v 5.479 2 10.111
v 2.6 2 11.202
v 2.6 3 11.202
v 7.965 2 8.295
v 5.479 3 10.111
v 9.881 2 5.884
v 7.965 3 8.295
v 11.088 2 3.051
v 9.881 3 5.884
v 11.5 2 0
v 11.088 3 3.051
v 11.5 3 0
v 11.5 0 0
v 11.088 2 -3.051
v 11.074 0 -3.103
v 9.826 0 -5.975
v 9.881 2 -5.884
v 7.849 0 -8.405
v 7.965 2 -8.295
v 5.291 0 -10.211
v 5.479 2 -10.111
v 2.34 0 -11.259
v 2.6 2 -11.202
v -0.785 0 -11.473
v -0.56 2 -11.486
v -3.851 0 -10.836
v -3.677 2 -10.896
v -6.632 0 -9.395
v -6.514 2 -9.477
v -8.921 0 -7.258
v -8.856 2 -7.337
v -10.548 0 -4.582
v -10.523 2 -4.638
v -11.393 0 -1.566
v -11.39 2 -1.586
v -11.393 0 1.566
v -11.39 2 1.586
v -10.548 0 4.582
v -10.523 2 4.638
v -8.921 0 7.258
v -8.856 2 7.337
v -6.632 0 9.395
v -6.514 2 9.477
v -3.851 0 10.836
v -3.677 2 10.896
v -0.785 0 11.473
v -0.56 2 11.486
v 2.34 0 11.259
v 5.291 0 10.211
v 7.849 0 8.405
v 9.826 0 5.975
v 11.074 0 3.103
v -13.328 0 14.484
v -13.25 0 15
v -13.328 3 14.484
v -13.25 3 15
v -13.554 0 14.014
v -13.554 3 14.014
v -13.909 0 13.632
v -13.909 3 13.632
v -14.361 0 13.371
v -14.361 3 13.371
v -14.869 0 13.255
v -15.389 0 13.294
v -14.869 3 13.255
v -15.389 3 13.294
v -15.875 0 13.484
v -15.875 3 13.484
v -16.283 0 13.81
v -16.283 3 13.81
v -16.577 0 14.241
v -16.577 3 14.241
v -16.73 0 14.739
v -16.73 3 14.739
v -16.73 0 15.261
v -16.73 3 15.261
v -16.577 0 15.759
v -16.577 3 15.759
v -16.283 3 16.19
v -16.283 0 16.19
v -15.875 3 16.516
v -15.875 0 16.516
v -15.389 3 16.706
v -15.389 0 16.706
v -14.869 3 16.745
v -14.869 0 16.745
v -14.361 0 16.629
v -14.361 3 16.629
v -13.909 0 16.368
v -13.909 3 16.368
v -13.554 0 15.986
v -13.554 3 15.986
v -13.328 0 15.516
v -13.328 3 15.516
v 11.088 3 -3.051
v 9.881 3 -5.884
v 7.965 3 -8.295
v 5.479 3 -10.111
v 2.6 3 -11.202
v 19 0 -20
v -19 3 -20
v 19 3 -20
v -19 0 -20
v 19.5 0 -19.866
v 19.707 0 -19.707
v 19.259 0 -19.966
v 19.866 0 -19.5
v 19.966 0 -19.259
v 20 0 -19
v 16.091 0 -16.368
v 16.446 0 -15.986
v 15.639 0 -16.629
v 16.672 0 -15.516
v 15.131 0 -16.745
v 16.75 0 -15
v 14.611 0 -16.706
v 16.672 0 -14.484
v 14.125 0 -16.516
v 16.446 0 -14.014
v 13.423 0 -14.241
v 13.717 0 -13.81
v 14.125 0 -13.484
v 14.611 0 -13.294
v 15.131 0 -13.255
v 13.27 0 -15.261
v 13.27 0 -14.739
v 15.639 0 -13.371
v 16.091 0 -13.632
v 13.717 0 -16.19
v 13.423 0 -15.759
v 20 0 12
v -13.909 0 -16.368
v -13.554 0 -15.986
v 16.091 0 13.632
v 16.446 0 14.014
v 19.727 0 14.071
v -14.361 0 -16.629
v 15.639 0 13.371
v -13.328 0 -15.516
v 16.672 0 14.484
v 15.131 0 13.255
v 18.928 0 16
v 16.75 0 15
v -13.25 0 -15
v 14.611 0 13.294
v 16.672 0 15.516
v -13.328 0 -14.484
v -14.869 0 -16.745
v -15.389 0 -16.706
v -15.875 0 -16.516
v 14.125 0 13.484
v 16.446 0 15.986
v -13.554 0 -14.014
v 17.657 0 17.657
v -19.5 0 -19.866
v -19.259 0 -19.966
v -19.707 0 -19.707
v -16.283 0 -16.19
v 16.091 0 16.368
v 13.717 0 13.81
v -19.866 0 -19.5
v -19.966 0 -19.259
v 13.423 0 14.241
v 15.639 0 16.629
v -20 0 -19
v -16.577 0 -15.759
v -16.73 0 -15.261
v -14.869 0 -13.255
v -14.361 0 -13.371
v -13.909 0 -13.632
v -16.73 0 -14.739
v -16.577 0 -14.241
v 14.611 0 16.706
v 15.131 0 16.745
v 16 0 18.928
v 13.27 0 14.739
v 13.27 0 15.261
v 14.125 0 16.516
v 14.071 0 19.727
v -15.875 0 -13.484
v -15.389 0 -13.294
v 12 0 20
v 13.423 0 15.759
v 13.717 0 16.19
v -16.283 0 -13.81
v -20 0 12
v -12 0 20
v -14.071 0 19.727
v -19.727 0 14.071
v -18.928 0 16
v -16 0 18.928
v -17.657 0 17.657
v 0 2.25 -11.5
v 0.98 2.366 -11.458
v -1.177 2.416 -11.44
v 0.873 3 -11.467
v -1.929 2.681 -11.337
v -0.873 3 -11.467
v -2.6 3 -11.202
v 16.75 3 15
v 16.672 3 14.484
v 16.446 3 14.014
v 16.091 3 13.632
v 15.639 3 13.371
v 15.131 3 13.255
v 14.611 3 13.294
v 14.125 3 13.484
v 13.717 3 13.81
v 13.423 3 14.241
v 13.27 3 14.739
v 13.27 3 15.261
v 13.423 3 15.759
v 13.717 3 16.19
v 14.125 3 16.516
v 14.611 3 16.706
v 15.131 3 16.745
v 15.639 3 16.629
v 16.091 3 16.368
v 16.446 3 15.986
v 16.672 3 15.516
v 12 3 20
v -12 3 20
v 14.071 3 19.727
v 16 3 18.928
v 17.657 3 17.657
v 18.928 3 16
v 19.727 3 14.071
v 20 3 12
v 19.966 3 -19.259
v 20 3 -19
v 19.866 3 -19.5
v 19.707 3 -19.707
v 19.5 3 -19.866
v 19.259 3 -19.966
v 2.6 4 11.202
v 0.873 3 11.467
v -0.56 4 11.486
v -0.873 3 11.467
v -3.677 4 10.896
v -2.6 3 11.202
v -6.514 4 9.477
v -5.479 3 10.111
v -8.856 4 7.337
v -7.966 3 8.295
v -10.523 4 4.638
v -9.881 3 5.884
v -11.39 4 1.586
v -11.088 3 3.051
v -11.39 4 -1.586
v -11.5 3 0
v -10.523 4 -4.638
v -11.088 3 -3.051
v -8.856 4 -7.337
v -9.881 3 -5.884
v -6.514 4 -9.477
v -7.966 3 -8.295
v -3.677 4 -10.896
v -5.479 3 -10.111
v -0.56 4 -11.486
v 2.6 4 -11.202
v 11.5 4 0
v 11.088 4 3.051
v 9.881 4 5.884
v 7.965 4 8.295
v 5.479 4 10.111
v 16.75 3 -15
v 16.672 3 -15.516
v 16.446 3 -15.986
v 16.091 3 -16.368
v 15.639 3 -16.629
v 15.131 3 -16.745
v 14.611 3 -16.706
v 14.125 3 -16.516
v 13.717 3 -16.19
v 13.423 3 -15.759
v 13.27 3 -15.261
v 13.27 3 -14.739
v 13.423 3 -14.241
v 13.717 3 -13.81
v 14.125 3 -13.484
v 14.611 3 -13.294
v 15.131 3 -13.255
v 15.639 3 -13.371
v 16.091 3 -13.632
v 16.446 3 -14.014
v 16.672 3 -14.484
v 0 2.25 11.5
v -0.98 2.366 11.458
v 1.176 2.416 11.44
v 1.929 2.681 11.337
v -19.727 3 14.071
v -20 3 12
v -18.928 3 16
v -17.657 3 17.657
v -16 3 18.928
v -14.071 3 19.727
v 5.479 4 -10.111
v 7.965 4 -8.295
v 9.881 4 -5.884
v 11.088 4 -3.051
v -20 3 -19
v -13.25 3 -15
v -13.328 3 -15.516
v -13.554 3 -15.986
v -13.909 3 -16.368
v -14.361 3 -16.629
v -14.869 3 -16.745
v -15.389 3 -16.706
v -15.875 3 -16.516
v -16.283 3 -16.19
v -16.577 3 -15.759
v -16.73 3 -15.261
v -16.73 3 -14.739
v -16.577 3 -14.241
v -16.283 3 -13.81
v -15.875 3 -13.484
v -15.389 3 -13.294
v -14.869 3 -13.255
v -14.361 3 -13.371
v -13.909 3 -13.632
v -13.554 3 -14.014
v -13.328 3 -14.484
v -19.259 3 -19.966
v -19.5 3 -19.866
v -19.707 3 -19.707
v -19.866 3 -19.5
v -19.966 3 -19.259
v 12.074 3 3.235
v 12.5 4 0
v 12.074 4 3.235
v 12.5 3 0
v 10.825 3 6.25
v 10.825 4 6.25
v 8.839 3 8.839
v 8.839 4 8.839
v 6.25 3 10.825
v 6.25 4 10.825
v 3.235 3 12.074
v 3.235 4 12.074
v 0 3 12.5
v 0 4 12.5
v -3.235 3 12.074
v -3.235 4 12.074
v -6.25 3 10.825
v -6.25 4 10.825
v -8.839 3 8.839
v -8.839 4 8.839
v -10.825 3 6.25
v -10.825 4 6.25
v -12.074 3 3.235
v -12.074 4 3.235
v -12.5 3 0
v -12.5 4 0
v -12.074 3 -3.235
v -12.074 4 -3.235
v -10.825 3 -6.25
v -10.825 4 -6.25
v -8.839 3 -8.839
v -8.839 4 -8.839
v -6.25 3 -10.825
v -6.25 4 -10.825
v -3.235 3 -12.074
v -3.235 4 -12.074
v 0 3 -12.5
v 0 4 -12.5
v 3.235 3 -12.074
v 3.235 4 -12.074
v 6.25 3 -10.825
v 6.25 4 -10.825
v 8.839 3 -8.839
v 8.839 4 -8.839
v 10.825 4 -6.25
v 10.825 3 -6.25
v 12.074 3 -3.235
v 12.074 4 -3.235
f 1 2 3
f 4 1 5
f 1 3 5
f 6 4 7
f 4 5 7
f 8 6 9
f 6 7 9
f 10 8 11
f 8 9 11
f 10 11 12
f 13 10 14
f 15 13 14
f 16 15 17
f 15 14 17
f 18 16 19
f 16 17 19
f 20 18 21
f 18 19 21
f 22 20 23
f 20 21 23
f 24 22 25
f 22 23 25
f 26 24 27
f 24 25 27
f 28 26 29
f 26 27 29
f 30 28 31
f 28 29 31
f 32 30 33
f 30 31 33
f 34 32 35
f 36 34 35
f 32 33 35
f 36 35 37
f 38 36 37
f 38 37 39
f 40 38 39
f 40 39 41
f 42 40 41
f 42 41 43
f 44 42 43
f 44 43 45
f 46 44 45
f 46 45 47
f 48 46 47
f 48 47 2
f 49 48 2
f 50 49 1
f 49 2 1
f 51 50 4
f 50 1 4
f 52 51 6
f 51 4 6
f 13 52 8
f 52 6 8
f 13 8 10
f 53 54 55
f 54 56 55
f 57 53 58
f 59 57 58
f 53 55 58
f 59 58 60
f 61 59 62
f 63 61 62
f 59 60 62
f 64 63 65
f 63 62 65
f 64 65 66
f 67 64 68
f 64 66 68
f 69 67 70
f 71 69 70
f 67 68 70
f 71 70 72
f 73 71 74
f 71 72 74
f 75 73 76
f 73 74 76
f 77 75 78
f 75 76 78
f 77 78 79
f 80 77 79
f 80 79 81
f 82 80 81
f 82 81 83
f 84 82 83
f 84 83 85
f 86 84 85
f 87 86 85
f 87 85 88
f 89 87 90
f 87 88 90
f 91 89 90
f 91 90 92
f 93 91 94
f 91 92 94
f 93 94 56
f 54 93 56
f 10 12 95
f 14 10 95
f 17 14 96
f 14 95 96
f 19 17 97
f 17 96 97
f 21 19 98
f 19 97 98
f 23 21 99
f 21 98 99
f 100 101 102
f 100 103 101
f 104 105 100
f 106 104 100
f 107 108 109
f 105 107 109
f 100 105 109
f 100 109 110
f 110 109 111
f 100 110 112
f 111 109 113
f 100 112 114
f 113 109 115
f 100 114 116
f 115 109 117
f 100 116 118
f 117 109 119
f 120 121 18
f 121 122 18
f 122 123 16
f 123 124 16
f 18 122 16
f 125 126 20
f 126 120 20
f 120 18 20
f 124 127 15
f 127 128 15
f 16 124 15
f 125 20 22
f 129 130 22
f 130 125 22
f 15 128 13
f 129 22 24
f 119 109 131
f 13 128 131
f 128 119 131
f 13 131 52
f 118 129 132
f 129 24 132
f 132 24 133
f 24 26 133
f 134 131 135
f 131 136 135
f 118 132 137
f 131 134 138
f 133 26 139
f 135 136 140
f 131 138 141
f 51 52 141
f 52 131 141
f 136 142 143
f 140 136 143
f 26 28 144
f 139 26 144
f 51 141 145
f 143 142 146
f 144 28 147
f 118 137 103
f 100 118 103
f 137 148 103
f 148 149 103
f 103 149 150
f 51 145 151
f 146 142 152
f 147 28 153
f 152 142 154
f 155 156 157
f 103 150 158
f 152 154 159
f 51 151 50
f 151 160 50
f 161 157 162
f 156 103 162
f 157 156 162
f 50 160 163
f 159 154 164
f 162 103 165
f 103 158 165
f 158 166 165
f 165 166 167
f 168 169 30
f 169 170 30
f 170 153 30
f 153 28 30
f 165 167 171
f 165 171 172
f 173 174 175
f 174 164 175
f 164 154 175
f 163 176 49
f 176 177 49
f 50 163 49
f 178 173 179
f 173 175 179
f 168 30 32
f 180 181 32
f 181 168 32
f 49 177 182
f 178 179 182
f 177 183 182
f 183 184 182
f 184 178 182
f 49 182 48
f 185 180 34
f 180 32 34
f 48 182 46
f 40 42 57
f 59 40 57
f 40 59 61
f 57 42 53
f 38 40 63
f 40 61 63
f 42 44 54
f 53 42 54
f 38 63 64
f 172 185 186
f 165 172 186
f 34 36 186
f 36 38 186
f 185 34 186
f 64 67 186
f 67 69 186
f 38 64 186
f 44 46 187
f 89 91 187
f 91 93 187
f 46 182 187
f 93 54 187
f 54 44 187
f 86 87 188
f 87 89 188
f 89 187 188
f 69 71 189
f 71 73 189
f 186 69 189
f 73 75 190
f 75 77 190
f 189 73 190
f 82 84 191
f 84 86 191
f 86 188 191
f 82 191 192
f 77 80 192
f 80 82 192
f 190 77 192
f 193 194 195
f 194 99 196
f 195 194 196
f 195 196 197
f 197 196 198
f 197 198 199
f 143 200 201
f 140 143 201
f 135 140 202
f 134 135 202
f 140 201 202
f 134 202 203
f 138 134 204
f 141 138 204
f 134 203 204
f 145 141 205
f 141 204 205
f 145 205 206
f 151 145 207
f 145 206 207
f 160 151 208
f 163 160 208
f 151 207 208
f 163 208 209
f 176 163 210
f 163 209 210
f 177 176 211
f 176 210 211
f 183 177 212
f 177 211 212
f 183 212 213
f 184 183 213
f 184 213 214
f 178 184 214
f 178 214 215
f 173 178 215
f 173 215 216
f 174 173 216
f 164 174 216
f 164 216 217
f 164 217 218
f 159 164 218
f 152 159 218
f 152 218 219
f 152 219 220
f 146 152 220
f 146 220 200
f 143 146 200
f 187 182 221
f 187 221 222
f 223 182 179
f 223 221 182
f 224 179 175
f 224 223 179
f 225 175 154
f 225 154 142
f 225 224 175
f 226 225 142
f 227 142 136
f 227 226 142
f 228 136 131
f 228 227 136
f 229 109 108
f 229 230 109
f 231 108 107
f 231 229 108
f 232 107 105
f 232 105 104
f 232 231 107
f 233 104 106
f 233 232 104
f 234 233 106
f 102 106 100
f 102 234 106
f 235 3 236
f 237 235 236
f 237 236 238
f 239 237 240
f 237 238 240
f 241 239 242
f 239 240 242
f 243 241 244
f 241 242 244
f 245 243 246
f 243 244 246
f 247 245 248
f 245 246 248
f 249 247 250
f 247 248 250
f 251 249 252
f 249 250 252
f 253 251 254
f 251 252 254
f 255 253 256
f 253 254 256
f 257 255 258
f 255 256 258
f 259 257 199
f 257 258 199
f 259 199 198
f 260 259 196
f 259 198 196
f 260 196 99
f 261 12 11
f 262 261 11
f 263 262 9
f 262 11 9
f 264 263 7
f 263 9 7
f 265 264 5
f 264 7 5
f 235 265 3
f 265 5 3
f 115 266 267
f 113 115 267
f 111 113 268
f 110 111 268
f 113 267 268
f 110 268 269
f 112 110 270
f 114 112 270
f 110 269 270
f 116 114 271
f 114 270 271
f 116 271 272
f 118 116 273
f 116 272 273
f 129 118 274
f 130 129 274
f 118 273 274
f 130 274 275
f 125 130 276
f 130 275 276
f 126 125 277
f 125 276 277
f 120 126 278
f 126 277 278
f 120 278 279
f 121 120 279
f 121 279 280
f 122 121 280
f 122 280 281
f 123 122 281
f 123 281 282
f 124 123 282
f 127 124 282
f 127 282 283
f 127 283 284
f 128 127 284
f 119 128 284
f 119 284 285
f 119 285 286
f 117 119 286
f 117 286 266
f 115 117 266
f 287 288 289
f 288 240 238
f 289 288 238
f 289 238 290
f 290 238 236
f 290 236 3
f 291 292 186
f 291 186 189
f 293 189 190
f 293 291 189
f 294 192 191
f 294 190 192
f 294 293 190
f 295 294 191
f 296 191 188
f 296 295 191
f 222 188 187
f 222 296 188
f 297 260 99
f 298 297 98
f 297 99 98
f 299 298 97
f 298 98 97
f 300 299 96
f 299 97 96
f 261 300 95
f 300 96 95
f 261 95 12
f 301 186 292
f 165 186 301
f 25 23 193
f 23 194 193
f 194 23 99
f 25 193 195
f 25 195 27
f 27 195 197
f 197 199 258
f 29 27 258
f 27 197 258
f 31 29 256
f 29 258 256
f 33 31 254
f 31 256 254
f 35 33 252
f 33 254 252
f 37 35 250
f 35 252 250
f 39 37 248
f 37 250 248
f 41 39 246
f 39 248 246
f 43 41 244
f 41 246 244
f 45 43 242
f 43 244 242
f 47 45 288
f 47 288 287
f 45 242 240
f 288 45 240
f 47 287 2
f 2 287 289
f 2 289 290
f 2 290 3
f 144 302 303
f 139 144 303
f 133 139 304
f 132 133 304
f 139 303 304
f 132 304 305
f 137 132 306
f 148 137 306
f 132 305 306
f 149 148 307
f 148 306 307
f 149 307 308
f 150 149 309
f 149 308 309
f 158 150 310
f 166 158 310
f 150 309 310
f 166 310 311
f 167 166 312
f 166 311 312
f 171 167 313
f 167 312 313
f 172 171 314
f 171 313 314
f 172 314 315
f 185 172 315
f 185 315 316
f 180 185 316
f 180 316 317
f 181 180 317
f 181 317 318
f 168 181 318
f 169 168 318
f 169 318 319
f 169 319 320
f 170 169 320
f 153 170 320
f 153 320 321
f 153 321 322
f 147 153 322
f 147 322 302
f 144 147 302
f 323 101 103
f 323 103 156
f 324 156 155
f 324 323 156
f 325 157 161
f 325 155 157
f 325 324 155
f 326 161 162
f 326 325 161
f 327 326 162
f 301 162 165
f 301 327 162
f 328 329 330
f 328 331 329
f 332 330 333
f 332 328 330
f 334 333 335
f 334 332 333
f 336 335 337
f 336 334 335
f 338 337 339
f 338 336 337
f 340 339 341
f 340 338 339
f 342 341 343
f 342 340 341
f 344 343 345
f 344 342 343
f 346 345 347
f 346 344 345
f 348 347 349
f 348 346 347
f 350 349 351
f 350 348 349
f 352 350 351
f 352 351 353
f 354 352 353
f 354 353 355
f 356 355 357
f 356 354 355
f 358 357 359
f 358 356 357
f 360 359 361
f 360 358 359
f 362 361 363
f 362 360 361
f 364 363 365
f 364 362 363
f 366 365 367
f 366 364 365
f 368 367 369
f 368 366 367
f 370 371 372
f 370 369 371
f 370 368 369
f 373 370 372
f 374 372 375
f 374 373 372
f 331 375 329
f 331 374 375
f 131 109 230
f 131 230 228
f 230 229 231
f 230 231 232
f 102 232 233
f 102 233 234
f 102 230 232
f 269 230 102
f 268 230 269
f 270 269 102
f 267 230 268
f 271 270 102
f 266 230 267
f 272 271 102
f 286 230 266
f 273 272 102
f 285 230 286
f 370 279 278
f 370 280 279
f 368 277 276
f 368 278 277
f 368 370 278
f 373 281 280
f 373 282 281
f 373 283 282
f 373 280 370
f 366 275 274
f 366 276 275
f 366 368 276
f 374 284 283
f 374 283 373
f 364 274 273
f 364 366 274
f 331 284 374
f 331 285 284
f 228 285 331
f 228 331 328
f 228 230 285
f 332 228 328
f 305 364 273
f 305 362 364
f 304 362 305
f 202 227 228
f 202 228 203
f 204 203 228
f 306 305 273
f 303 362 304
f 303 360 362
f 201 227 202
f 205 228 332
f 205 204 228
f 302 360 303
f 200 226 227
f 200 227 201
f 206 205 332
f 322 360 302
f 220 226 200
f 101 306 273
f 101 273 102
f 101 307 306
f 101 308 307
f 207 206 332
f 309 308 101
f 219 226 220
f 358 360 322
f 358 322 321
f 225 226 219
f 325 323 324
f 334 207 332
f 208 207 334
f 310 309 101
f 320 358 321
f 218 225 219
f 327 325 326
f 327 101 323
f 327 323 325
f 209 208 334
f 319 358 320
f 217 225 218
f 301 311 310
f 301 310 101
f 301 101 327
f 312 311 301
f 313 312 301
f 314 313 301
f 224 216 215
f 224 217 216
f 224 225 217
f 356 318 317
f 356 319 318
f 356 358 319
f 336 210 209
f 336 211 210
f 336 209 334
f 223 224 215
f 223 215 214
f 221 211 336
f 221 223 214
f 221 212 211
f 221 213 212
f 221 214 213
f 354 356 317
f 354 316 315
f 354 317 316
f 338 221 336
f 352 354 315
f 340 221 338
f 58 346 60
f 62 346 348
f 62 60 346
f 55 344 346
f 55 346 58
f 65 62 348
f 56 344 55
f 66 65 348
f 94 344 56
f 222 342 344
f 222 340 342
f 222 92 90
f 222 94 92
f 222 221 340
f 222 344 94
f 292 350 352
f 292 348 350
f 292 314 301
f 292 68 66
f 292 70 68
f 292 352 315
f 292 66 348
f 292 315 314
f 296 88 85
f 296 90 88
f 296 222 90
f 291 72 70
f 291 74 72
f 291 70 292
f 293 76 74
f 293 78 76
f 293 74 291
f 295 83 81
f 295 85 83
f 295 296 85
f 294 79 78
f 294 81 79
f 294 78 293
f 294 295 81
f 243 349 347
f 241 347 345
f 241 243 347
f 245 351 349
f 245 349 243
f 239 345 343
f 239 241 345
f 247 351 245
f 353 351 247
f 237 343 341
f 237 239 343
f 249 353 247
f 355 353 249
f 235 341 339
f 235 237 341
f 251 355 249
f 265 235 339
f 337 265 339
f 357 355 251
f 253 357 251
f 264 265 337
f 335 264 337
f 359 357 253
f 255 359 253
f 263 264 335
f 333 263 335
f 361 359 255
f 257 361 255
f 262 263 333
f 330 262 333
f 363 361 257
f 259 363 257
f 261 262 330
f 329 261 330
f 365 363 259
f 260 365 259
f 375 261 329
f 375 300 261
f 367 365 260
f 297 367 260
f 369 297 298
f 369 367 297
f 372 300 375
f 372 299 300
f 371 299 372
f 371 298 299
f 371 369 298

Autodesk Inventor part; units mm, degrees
ref_plane "YZ Plane" through (0, 0, 0) normal (1, 0, 0) x (0, 1, 0)
ref_plane "XZ Plane" through (0, 0, 0) normal (0, 1, 0) x (-1, 0, 0)
ref_plane "XY Plane" through (0, 0, 0) normal (0, 0, 1) x (1, 0, 0)
sketch "Sketch1" plane through (0, 0, 0) normal (0, 1, 0) x (-1, 0, 0)
  line L0 (-20, 20) -> (20, 20)
  line L1 (20, 20) -> (20, -20)
  line L2 (20, -20) -> (-20, -20)
  line L3 (-20, -20) -> (-20, 20)
  line L4 (-20, 20) -> (20, -20) construction
  line L5 (20, 20) -> (-20, -20) construction
  circle A0 centre (0, 0) radius 4
  circle A1 centre (0, 8.5) radius 1.75
  circle A2 centre (0, -8.5) radius 1.75
  point P0 (0, 0)
  point P1 (0, 0)
  dimension "d0" = 40
  dimension "d1" = 40
  dimension "d2" = 8
  dimension "d3" = 3.5
  dimension "d4" = 3.5
  dimension "d5" = 8.5
  dimension "d6" = 8.5
extrude "Extrusion1" add sketch "Sketch1" along normal blind 3
chamfer "Chamfer1" distance 2 angle 45 2 edges at (1.75, 3, -8.5) (1.75, 3, 8.5)
sketch "Sketch3" plane through (0, 3, 0) normal (0, 1, 0) x (1, 0, 0)
  circle A0 centre (-15, -15) radius 1.75
  circle A1 centre (-15, 15) radius 1.75
  circle A2 centre (15, 15) radius 1.75
  circle A3 centre (15, -15) radius 1.75
  point P0 (0, 0)
  dimension "d13" = 3.5
  dimension "d14" = 15
  dimension "d15" = 15
  dimension "d16" = 15
  dimension "d17" = 15
extrude "Extrusion2" cut sketch "Sketch3" against normal through all
sketch "Sketch4" plane through (0, 3, 0) normal (0, 1, 0) x (1, 0, 0)
  circle A0 centre (0, 0) radius 11.5
  dimension "d20" = 23
extrude "Extrusion3" cut sketch "Sketch4" against normal blind 10
sketch "Sketch5" plane through (0, 3, 0) normal (0, 1, 0) x (1, 0, 0)
  circle A0 centre (0, 0) radius 11.5
  circle A1 centre (0, 0) radius 12.5
  arc A2 (2.6001, -11.2022) -> (2.6001, 11.2022) centre (0, 0) ccw projected
  dimension "d23" = 1
extrude "Extrusion4" add sketch "Sketch5" along normal mid plane 2
fillet "Fillet2" radius 8 2 edges at (-20, 1.5, 20) (20, 1.5, 20)
fillet "Fillet3" radius 1 2 edges at (20, 1.5, -20) (-20, 1.5, -20)
properties part number "soportemotor"
